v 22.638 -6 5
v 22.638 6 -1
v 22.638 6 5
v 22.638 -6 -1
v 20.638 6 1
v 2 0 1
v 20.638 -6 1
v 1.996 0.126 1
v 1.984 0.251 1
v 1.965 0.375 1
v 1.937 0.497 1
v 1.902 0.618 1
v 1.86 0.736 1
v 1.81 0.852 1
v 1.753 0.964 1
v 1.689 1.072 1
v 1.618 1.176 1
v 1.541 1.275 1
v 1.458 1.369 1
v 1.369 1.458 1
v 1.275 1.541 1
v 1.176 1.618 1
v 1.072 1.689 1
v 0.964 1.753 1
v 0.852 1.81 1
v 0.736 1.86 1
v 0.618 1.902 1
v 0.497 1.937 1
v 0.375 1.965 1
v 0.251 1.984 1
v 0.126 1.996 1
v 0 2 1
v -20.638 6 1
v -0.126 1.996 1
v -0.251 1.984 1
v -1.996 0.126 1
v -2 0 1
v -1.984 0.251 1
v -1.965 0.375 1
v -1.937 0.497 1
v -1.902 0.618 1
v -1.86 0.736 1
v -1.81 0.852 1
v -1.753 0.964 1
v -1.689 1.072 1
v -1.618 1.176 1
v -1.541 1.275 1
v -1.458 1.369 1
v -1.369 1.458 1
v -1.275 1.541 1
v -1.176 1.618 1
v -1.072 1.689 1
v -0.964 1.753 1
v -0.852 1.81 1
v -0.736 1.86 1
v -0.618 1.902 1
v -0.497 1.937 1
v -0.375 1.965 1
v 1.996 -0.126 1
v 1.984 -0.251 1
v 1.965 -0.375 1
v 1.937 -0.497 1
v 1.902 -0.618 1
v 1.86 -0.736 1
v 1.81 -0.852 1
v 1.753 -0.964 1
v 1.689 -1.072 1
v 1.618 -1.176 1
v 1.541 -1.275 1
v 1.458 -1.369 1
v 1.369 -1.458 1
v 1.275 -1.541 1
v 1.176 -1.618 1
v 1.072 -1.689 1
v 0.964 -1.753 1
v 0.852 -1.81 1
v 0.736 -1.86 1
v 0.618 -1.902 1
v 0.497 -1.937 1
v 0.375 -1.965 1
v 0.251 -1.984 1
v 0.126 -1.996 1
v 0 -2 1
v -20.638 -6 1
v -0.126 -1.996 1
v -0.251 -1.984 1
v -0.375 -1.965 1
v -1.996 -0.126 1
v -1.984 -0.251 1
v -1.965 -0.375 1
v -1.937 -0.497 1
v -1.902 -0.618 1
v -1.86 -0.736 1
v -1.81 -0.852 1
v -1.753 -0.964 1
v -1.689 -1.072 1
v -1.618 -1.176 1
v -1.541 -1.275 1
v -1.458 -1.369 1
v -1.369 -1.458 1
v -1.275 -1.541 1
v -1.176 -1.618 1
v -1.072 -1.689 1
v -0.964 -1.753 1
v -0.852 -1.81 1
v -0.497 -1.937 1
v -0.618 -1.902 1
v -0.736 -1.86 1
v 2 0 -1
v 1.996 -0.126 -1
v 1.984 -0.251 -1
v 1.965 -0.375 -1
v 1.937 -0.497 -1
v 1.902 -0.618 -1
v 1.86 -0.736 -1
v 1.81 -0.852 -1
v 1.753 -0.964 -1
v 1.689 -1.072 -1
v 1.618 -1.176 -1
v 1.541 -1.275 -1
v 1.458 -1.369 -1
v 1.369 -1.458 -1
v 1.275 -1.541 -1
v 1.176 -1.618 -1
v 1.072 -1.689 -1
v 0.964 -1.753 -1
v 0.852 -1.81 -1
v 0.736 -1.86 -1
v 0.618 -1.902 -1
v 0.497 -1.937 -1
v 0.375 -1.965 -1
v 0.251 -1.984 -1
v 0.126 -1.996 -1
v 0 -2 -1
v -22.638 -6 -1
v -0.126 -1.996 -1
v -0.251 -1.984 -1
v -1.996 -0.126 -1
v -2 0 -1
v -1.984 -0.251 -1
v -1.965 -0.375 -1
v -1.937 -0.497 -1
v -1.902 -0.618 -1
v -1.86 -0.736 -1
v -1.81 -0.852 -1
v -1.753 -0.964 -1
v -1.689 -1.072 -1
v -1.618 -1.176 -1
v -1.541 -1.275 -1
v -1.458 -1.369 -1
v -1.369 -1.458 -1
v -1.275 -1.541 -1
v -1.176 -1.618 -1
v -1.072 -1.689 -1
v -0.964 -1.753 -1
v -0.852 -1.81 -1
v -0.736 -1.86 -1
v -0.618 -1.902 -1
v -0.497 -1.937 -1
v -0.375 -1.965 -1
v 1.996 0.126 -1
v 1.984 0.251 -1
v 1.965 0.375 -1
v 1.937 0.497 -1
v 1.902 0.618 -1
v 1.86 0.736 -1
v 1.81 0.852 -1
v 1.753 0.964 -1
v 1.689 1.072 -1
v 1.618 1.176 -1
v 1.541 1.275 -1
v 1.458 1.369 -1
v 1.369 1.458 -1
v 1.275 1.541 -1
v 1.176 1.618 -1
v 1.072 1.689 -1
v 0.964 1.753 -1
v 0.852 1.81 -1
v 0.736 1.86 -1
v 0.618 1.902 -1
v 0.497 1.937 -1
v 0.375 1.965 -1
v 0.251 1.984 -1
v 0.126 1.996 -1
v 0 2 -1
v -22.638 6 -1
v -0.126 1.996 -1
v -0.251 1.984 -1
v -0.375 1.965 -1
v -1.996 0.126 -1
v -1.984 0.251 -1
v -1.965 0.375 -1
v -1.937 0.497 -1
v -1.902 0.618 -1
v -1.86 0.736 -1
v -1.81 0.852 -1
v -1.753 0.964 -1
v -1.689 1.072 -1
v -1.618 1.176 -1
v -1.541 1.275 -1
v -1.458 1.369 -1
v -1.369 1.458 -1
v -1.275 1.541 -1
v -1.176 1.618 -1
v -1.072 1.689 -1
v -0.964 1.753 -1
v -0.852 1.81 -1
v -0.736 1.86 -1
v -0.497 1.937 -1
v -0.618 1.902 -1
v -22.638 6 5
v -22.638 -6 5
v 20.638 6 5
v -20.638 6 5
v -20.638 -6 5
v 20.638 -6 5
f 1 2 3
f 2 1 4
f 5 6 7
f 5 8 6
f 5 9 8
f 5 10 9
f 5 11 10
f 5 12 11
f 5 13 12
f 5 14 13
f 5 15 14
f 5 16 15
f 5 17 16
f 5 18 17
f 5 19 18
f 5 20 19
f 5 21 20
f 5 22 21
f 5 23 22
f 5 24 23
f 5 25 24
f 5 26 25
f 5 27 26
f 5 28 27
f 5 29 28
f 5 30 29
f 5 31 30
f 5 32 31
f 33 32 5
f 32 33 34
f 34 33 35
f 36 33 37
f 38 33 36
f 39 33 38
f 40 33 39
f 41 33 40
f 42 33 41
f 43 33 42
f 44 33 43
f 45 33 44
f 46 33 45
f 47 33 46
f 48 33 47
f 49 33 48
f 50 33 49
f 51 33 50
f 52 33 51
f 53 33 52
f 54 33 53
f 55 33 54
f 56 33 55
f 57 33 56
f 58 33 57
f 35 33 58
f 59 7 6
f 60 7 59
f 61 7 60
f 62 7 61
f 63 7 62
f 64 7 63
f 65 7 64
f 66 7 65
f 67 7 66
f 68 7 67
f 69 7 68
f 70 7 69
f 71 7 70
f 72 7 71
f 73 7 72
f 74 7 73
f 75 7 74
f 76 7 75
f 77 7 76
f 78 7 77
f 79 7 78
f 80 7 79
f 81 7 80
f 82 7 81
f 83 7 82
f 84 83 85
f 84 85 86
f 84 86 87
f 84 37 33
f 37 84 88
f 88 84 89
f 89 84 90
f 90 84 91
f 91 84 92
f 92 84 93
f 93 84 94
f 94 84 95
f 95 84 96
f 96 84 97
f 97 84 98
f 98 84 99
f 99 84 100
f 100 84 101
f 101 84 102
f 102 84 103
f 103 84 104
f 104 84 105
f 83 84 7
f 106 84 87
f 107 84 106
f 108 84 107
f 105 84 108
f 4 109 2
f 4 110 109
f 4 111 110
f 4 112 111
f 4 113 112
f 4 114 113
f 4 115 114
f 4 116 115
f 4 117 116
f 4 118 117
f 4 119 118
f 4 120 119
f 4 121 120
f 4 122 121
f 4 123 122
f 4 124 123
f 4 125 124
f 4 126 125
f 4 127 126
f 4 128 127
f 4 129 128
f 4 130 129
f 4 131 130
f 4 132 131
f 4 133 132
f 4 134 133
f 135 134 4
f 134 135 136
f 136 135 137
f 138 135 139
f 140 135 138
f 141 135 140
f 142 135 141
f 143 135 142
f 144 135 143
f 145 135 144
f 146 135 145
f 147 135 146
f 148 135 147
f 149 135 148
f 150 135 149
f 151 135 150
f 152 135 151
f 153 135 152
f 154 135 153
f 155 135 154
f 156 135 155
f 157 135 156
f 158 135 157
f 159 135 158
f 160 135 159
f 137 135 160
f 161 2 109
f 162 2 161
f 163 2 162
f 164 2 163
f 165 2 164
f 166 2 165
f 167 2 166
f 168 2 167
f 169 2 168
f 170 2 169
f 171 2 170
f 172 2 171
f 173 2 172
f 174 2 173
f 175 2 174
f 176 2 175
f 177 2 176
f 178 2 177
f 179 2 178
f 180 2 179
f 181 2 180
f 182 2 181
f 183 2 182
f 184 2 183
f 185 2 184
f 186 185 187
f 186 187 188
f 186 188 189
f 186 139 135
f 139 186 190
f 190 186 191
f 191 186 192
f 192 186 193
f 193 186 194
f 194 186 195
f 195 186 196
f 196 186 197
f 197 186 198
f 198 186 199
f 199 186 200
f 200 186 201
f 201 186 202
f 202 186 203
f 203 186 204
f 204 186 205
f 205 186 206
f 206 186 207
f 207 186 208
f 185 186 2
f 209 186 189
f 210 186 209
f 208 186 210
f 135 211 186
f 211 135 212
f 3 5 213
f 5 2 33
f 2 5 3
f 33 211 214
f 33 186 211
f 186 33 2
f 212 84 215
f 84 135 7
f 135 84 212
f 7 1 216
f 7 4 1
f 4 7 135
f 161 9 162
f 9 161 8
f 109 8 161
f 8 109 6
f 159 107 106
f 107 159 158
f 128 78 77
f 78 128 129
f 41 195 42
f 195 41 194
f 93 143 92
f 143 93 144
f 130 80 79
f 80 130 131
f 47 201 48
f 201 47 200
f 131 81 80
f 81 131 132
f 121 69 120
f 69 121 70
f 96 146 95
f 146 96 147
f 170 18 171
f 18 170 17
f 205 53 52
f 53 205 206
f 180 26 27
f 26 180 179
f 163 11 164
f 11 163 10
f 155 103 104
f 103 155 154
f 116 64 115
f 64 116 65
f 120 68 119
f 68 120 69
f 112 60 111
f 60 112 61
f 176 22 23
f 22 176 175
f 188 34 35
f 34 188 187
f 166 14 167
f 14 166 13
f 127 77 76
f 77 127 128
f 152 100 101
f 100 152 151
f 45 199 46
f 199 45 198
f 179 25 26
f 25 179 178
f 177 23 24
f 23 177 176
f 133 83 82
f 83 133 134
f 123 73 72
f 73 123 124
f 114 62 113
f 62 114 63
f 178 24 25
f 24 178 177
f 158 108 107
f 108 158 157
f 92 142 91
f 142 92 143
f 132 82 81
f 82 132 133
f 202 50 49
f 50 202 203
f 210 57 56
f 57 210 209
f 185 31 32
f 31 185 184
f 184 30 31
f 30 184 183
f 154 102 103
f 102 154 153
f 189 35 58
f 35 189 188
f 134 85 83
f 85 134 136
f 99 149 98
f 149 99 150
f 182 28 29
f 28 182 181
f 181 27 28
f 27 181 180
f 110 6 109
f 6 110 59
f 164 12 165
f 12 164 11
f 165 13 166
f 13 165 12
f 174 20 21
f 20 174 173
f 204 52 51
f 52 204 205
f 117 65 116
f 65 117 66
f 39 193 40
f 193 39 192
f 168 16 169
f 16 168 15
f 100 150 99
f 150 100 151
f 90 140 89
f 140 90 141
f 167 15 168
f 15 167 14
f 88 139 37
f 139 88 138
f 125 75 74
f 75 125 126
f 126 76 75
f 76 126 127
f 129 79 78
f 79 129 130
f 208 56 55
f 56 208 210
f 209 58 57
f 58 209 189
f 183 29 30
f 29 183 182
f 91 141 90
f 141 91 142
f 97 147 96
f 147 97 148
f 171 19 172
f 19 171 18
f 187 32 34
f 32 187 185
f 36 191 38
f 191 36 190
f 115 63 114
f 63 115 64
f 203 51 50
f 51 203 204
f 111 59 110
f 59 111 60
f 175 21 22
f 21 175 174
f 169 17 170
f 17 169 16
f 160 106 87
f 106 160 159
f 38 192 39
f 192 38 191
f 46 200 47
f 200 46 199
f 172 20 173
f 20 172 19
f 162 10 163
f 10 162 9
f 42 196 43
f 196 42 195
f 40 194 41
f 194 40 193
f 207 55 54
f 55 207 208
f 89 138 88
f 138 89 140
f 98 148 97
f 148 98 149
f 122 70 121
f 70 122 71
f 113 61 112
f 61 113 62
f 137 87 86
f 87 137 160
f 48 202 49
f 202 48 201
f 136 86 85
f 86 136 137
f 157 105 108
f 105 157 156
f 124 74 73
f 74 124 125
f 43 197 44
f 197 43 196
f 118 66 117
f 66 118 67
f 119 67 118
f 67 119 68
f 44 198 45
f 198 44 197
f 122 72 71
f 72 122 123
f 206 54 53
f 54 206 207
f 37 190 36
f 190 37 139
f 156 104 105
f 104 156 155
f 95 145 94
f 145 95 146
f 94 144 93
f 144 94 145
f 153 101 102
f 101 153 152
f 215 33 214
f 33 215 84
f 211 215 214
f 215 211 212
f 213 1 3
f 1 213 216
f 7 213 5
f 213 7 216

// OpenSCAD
// joist to mount to
beam_width = 41.275;
// screw hole
hole_r = 2;
$fn = 100;

ear_x = 2;
ear_y = 12;
ear_z = 5;

bracket_x = beam_width + (ear_x * 2);
bracket_y = 12;
bracket_z = 2;


difference() {
    // x, y, z
    cube([bracket_x, bracket_y, bracket_z], center = true);
  
    cylinder(10, hole_r, hole_r, true);
}

// left ear
translate([(bracket_x * -.5), (bracket_y * -.5), 0])
    cube([ear_x, ear_y, ear_z]);

// right ear
translate([((bracket_x * .5) - ear_x), (bracket_y * -.5), 0])
    cube([ear_x, ear_y, ear_z]);
